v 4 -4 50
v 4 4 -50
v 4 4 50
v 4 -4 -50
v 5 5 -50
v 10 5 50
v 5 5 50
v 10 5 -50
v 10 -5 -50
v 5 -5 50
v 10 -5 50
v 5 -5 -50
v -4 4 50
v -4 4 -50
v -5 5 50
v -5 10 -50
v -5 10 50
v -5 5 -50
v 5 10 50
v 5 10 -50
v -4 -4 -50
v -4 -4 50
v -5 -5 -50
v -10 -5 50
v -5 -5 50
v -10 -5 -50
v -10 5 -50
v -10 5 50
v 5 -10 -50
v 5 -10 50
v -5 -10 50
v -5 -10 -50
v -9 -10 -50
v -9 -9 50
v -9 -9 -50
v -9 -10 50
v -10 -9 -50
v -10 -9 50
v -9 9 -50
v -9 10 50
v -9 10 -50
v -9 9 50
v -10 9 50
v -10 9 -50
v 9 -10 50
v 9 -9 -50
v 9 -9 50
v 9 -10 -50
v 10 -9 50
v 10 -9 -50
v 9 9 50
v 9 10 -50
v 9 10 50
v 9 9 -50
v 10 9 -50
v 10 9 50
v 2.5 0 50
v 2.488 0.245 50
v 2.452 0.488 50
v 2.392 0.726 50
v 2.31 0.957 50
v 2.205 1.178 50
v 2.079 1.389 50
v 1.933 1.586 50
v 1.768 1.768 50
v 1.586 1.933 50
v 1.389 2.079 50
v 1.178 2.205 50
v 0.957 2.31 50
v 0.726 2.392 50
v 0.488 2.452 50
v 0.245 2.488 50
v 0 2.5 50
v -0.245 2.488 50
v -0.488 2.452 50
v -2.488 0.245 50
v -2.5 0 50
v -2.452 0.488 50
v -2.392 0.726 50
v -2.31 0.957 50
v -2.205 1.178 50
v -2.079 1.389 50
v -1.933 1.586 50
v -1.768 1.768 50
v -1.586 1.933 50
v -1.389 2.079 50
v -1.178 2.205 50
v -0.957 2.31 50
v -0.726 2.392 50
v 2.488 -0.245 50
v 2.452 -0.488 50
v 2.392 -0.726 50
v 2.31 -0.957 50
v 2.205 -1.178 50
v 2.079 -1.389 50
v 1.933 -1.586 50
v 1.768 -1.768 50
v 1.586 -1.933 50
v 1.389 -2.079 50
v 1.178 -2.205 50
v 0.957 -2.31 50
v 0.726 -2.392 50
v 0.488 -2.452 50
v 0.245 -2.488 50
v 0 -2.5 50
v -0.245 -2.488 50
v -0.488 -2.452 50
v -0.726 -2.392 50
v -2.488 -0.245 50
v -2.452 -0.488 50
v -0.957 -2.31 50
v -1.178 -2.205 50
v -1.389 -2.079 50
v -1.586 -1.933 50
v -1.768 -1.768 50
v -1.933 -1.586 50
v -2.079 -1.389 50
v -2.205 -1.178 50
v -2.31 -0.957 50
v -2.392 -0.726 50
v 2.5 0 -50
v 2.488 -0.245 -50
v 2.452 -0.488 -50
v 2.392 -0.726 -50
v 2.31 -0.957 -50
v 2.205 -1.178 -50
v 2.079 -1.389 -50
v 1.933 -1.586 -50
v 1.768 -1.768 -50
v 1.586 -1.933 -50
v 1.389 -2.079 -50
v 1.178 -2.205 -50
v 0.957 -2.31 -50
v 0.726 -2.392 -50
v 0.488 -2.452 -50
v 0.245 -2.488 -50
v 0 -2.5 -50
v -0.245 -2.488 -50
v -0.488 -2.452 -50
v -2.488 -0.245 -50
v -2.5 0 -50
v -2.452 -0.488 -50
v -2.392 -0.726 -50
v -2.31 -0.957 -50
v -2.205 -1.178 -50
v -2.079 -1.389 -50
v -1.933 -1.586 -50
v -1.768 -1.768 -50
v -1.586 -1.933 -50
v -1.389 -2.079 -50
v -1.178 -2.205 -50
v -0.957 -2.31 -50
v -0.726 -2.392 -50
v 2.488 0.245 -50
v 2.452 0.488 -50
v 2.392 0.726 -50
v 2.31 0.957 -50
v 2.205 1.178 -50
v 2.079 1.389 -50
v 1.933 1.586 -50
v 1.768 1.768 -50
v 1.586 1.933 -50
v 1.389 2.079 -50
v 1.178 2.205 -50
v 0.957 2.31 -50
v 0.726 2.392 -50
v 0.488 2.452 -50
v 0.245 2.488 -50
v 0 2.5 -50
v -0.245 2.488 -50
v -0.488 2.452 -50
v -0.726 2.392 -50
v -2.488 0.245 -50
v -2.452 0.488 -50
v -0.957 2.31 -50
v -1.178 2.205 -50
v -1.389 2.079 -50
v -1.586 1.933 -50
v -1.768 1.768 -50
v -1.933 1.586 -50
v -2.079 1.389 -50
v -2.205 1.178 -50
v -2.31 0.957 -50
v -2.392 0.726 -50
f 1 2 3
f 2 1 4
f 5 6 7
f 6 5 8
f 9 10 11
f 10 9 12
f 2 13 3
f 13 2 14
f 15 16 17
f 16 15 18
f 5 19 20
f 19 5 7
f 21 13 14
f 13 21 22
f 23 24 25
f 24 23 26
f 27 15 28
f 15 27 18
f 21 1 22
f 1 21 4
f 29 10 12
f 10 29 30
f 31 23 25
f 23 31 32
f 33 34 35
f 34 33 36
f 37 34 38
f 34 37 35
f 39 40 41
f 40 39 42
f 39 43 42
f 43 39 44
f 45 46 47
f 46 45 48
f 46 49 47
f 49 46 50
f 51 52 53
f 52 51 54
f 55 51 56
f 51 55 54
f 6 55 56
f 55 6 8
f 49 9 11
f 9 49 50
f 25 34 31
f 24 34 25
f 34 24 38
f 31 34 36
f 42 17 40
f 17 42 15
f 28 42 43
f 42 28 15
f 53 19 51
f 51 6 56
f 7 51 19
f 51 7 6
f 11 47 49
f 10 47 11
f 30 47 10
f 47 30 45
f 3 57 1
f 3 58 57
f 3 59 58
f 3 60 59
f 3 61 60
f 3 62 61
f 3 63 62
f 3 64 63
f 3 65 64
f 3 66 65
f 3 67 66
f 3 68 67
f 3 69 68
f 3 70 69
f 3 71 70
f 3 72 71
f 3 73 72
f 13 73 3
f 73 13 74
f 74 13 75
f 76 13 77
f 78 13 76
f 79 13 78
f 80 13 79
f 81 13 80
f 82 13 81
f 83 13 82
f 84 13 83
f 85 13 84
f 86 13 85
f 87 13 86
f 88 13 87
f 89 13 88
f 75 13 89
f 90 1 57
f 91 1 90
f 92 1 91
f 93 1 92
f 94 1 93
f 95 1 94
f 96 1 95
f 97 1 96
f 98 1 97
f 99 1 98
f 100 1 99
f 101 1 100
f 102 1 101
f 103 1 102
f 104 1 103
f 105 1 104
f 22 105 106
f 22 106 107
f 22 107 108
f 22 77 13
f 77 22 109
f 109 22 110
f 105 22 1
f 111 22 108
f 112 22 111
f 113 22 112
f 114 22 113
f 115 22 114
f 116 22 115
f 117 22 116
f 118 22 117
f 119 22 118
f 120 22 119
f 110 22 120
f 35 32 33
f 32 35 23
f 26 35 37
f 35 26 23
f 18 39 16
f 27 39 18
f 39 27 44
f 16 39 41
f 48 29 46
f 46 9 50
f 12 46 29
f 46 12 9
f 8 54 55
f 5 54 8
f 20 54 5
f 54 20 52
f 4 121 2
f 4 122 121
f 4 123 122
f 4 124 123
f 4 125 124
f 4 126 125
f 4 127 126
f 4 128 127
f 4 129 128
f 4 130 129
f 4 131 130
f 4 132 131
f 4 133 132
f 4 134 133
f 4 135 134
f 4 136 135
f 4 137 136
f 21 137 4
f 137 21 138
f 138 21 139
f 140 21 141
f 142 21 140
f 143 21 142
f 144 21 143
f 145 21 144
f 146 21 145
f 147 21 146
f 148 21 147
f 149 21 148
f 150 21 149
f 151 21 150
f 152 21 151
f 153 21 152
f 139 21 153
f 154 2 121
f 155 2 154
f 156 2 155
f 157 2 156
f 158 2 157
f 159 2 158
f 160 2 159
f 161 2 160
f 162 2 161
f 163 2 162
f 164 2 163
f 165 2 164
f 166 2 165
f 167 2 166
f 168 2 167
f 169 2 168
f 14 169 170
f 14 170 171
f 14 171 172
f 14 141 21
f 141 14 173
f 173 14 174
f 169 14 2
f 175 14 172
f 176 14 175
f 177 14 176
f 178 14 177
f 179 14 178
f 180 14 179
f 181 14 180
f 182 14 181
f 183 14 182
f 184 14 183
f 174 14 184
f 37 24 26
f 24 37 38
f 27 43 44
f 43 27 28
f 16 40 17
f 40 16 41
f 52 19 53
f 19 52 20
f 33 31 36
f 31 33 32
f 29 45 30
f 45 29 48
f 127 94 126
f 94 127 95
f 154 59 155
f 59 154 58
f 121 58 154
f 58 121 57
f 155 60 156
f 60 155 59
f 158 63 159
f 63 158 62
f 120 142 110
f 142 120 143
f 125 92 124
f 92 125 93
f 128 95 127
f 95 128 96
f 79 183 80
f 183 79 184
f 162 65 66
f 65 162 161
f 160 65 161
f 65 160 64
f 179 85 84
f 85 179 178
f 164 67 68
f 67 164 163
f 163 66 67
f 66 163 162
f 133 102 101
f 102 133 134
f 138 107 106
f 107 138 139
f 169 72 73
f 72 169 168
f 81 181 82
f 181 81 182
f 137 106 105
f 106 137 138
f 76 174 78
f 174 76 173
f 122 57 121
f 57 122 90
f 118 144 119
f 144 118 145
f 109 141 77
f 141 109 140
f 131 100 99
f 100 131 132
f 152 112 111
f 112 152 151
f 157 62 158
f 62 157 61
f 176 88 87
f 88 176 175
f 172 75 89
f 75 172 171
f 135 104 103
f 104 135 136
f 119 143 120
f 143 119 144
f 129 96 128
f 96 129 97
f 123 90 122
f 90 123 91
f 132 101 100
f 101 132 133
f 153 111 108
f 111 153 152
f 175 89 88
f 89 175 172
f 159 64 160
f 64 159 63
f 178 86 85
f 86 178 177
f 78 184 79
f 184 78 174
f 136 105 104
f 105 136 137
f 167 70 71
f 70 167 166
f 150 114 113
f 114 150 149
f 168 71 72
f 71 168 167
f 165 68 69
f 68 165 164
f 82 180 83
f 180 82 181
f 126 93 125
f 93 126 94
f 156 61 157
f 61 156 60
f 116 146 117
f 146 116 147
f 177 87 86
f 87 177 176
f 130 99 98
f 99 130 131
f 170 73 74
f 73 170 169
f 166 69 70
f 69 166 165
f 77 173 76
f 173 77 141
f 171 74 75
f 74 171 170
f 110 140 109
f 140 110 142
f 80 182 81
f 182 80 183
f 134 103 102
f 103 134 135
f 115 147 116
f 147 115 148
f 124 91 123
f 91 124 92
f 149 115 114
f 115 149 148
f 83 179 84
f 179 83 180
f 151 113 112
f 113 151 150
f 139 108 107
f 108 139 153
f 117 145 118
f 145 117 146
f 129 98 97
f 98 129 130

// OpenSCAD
// 2020 aluminium extrusion (approximate T-slot profile)
// Target: 20mm x 20mm cross-section, 100mm long

$fn = 64;

// Parameters
profile_size     = 20.0;   // mm
length           = 100.0;  // mm (extrusion direction)

bore_d           = 5.0;    // center bore diameter

slot_opening_w   = 6.0;    // slot mouth width at the surface
slot_inner_w     = 10.0;   // wider internal cavity width
slot_depth       = 6.0;    // depth from outer face toward center

edge_chamfer     = 0.8;    // corner chamfer size
overlap          = 0.2;    // small overlap for robust booleans

// --- Helpers ---
module extrusion_main_body() {
    cube([profile_size, profile_size, length], center=true);
}

module central_bore() {
    cylinder(h=length + 2*overlap, r=bore_d/2, center=true);
}

// One face T-slot cut (along +X face), then rotated for 4 sides
module tslot_one_face() {
    // Place cuts so their outer face is slightly outside the profile to guarantee opening
    x_outer = profile_size/2 + overlap;
    x_inner = profile_size/2 - slot_depth;

    // Internal cavity (wider), starts at x_inner and reaches x_outer
    translate([(x_inner + x_outer)/2, 0, 0])
        cube([ (x_outer - x_inner), slot_inner_w, length + 2*overlap ], center=true);

    // Mouth (narrower) near the surface; make it slightly deeper to ensure it connects to cavity
    mouth_depth = slot_depth * 0.55;
    x_mouth_inner = profile_size/2 - mouth_depth;
    translate([(x_mouth_inner + x_outer)/2, 0, 0])
        cube([ (x_outer - x_mouth_inner), slot_opening_w, length + 2*overlap ], center=true);
}

module t_slots_4x() {
    for (a = [0:90:270])
        rotate([0,0,a]) tslot_one_face();
}

// Corner chamfers: subtract small cubes at the four outer corners
module edge_chamfers() {
    // Chamfer cube centered at each corner, pushed slightly outward so it actually removes material
    dx = profile_size/2 - edge_chamfer/2;
    for (sx = [-1, 1], sy = [-1, 1])
        translate([sx*dx, sy*dx, 0])
            cube([edge_chamfer + 2*overlap, edge_chamfer + 2*overlap, length + 2*overlap], center=true);
}

// Final extrusion (single connected solid)
difference() {
    extrusion_main_body();
    central_bore();
    t_slots_4x();
    edge_chamfers();
}
